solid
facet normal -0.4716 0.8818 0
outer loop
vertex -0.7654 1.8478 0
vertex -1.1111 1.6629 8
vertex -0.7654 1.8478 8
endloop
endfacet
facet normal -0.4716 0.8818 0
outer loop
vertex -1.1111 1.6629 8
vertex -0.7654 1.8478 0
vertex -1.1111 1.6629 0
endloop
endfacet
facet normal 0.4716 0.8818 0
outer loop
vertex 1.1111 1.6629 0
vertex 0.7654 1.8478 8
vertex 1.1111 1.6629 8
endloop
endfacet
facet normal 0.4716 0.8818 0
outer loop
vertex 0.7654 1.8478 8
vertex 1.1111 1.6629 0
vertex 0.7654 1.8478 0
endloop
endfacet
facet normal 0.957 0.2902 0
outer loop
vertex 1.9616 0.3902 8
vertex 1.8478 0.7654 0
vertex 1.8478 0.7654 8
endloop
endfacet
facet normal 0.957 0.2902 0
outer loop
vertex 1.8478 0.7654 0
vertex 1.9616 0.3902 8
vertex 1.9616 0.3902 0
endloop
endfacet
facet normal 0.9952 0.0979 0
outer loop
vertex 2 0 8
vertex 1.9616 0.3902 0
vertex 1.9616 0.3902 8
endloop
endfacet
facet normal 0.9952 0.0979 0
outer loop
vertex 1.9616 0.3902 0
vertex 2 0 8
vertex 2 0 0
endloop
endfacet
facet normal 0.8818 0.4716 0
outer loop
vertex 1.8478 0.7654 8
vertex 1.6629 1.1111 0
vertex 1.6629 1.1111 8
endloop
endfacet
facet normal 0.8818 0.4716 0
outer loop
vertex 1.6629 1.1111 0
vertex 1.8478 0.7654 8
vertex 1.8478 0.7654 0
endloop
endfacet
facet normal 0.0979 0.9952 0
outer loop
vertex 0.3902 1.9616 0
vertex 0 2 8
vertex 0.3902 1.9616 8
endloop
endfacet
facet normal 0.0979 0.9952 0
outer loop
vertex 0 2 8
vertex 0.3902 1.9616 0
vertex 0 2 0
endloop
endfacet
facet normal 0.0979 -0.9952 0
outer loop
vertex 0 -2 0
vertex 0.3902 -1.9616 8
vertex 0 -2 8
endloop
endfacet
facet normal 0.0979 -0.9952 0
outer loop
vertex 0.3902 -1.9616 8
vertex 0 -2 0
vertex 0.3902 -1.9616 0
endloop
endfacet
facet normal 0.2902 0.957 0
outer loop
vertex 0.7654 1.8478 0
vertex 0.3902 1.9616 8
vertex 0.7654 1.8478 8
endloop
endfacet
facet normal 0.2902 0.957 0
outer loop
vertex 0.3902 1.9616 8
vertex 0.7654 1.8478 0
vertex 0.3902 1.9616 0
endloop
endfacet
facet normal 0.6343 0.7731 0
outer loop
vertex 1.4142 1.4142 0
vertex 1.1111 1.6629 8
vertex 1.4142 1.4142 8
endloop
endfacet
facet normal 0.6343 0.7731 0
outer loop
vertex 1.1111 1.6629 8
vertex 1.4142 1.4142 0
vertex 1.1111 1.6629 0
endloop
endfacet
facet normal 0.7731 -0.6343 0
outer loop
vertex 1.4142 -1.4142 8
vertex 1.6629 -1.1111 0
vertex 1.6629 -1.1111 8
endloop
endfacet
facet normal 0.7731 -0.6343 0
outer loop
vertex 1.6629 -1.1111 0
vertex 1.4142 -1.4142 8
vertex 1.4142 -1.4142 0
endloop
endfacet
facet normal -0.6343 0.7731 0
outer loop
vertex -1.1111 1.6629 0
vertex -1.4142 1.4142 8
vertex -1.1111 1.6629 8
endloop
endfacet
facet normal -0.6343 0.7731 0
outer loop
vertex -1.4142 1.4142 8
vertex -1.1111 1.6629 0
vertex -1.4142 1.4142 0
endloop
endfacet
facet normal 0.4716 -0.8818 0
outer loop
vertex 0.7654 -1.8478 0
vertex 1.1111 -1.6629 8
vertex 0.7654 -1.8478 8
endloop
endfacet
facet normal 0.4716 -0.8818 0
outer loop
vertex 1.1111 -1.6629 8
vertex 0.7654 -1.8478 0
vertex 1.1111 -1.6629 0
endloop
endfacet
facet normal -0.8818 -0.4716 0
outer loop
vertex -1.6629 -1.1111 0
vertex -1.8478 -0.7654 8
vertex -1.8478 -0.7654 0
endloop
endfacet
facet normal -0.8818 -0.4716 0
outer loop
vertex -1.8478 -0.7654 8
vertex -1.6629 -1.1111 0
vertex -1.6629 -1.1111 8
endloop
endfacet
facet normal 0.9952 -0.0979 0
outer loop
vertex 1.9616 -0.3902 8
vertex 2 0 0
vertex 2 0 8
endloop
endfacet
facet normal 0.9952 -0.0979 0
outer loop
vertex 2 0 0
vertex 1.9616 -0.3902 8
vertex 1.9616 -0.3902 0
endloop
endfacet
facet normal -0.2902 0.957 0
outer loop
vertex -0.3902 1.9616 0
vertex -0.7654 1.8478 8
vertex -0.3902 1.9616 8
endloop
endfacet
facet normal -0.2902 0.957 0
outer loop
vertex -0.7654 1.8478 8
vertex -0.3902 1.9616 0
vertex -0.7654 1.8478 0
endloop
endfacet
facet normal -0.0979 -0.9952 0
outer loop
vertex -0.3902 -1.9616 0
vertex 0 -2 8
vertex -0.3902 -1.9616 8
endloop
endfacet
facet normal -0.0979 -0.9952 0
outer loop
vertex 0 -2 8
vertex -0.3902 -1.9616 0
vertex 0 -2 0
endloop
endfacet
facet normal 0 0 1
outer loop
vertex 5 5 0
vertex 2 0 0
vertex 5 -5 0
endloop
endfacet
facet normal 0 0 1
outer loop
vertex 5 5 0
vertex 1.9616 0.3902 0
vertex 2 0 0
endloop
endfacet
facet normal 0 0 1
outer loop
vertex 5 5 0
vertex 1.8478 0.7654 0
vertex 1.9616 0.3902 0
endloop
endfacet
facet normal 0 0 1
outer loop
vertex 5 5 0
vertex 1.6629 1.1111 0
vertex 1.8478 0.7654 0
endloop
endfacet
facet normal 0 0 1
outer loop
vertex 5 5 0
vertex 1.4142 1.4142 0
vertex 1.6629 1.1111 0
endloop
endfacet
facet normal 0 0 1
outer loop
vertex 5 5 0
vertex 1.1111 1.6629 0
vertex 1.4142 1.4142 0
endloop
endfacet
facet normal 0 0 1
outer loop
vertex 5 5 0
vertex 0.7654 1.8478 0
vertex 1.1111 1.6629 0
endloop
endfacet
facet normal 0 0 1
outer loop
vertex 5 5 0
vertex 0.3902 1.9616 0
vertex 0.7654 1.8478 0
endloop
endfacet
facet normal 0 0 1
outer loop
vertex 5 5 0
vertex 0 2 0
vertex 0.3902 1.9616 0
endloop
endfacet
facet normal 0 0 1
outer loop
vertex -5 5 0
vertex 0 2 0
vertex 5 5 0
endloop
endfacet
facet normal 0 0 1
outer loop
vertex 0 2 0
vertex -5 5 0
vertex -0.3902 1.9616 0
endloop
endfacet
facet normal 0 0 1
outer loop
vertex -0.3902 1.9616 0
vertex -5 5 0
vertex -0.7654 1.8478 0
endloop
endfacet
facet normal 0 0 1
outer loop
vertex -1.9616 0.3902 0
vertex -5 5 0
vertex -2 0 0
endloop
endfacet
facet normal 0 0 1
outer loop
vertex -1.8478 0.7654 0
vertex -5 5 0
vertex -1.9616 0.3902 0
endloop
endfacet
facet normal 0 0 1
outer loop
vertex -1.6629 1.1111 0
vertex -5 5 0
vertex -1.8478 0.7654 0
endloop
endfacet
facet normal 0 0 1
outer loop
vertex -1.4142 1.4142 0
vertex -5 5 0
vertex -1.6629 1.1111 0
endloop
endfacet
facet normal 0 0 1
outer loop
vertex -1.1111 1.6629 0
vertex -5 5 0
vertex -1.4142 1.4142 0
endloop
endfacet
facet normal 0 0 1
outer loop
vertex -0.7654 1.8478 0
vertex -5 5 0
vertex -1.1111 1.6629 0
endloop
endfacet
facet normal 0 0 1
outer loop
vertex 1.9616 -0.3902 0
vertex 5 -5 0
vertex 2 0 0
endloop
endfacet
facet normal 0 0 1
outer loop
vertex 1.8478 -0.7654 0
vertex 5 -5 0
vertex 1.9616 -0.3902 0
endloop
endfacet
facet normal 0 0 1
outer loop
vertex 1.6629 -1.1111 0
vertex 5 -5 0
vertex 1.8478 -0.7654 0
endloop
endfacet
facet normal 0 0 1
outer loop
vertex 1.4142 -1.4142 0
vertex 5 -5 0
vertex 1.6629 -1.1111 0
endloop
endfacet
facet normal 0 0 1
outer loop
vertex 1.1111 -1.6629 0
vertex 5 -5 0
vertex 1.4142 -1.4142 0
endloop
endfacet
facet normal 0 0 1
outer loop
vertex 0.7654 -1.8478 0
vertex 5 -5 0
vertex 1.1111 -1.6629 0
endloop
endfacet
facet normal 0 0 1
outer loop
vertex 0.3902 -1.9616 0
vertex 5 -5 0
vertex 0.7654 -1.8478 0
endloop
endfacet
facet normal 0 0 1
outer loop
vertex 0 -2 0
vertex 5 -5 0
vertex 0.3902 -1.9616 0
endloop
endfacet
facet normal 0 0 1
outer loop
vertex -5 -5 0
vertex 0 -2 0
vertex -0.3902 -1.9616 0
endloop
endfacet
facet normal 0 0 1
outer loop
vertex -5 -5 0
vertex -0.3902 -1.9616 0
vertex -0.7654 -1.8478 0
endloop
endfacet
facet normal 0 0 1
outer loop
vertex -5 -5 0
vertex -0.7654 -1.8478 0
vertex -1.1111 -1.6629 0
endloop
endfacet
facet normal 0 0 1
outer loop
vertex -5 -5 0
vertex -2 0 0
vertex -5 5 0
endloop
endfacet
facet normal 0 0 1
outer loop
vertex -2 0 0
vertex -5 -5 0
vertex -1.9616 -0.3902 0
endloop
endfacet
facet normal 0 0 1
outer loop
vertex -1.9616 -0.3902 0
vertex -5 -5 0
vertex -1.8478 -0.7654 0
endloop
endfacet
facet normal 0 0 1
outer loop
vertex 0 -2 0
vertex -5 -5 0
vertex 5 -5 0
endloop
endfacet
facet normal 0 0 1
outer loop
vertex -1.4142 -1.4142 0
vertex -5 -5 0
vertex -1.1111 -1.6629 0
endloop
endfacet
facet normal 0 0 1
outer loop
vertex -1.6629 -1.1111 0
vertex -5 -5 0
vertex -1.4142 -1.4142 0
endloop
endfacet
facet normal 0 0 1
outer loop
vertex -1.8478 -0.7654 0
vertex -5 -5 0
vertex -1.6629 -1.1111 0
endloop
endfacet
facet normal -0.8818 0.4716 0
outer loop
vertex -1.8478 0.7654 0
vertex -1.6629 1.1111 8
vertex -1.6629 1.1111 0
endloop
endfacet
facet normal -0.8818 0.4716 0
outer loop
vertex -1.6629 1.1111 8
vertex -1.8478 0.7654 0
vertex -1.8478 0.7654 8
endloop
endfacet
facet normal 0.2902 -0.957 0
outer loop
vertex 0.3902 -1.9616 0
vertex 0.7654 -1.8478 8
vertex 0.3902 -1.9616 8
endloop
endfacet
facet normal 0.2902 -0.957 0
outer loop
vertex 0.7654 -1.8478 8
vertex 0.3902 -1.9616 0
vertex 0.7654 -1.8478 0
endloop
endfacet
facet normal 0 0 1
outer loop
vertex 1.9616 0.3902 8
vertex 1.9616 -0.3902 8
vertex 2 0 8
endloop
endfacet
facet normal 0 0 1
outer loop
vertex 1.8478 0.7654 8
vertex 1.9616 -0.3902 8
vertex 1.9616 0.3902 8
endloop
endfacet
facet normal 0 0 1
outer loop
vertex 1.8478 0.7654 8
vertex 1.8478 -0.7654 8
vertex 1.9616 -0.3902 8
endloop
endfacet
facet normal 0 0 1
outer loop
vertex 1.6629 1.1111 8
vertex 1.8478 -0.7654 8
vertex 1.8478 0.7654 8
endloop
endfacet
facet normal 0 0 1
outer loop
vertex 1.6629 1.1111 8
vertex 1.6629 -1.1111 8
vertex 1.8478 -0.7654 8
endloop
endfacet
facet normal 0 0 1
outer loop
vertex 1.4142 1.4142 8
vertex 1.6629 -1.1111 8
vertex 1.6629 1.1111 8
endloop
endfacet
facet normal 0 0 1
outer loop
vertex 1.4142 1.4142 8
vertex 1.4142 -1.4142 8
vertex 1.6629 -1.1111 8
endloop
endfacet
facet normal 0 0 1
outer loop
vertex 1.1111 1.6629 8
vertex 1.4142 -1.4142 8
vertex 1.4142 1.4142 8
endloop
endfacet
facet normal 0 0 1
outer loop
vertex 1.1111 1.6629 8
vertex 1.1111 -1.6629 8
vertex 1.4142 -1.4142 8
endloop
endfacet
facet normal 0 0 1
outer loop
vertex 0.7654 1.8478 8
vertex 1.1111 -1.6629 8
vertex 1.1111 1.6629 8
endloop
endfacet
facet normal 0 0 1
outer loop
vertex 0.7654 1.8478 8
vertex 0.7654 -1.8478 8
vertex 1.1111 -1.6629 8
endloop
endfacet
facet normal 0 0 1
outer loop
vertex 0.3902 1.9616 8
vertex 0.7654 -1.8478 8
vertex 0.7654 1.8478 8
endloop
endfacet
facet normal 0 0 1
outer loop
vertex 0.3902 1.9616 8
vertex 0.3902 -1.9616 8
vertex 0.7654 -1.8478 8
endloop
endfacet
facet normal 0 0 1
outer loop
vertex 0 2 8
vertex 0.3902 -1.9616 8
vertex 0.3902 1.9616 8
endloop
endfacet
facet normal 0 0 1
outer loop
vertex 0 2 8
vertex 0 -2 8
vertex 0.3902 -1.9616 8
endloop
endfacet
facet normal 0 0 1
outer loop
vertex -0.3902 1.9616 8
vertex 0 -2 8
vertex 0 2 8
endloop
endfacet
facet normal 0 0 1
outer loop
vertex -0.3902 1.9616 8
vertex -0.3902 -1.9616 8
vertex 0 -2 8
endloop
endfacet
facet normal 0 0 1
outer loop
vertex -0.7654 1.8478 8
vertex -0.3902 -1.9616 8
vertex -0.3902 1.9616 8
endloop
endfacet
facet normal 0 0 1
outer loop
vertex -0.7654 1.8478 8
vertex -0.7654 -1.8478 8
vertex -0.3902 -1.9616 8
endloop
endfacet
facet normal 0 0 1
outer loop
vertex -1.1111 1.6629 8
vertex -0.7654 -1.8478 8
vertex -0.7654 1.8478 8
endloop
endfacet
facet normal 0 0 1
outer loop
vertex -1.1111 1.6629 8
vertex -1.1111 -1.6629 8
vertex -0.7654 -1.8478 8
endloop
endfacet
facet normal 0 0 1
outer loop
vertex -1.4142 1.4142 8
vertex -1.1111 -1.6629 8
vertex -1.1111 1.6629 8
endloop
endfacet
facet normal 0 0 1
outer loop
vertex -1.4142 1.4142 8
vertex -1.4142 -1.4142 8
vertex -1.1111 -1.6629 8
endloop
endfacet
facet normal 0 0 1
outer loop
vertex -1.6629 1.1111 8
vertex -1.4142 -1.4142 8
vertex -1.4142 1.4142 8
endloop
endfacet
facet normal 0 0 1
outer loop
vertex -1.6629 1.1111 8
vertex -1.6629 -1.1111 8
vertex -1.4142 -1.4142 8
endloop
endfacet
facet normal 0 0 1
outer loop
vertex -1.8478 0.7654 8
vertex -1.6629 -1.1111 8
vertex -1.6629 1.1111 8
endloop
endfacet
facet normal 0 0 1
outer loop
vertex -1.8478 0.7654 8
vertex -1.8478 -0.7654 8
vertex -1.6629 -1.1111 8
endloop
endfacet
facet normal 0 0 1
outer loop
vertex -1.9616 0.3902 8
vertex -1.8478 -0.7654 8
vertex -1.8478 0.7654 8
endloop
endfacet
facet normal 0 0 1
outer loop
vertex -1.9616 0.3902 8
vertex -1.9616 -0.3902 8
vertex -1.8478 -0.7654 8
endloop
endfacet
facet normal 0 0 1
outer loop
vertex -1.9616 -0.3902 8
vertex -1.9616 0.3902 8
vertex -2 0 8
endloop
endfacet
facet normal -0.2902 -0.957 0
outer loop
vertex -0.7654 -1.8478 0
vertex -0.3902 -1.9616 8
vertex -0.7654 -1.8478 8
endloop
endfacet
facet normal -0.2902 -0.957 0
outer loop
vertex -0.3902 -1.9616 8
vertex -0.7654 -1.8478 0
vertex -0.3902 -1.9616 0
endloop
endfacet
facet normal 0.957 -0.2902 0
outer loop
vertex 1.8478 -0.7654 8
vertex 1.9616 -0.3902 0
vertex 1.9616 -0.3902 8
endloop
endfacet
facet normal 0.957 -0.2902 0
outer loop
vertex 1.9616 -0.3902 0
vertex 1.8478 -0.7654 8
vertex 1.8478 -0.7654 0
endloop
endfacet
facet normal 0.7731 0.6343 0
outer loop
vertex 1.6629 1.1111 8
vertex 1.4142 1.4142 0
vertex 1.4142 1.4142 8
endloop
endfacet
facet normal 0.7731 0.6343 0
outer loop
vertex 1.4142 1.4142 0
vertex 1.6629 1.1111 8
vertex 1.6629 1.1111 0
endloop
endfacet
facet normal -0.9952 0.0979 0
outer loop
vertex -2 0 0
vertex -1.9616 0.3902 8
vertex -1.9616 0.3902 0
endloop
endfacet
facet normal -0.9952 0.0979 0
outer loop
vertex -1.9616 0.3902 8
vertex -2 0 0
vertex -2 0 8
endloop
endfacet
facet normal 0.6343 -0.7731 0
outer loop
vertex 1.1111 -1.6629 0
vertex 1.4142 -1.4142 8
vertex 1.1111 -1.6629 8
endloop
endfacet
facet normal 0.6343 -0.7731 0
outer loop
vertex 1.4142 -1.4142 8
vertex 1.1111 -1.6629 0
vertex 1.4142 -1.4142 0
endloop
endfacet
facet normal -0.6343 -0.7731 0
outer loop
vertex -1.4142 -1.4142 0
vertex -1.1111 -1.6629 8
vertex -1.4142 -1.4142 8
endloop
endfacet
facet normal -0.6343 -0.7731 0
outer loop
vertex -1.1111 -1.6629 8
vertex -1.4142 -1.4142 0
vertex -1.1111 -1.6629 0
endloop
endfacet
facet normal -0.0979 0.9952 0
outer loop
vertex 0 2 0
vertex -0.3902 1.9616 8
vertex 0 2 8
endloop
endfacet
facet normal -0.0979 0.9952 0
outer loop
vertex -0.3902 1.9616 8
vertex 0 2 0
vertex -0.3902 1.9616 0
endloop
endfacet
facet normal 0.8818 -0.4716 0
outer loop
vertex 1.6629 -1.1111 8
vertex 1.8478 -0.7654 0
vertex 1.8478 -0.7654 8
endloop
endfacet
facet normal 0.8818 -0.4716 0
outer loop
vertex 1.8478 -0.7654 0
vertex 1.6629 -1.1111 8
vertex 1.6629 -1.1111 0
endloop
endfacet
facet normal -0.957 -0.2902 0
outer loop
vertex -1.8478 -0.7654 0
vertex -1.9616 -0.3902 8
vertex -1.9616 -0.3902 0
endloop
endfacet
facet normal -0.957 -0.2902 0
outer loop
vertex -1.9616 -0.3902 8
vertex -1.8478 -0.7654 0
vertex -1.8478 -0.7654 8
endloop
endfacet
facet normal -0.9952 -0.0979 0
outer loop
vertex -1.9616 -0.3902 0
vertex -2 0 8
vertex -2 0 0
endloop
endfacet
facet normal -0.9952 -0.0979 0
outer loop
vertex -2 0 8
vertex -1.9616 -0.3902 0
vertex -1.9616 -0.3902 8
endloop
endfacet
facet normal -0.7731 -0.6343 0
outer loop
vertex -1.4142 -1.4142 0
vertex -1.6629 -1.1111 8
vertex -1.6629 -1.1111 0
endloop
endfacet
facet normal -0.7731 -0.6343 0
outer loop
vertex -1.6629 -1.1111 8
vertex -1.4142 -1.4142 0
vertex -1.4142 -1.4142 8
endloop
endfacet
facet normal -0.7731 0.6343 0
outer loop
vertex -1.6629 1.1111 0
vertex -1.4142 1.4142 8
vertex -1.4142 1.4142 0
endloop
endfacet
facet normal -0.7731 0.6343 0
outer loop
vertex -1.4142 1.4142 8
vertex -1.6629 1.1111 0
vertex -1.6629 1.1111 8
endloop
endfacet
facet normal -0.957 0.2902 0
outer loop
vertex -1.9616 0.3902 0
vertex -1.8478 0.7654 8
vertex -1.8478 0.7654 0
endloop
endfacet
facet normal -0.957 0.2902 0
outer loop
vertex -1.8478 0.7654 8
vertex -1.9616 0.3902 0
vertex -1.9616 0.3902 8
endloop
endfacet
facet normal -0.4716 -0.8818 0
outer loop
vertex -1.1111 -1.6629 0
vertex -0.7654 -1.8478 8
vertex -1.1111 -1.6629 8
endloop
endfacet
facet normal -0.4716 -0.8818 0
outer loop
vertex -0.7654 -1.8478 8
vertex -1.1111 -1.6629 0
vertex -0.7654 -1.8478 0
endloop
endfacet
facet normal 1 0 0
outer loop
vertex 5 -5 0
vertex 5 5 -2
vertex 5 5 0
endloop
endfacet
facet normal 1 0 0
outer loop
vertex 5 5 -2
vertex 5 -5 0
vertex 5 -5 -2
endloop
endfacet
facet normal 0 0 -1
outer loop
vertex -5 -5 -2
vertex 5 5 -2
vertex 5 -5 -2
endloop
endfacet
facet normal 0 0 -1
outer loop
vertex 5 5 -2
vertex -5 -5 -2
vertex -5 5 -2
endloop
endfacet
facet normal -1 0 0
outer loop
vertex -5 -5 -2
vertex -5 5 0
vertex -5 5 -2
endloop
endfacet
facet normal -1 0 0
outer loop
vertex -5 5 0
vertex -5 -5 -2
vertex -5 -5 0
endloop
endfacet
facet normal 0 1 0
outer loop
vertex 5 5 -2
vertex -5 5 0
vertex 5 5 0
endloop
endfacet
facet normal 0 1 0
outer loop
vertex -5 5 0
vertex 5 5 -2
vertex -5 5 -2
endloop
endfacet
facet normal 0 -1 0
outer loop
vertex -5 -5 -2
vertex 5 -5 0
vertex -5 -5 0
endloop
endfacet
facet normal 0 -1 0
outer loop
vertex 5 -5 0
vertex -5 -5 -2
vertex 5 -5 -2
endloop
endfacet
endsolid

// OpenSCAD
union() {
	cylinder($fn = 32, d = 4.0, h = 8);
	translate(v = [0, 0, -1]) {
		cube(center = true, size = [10, 10, 2]);
	}
}
